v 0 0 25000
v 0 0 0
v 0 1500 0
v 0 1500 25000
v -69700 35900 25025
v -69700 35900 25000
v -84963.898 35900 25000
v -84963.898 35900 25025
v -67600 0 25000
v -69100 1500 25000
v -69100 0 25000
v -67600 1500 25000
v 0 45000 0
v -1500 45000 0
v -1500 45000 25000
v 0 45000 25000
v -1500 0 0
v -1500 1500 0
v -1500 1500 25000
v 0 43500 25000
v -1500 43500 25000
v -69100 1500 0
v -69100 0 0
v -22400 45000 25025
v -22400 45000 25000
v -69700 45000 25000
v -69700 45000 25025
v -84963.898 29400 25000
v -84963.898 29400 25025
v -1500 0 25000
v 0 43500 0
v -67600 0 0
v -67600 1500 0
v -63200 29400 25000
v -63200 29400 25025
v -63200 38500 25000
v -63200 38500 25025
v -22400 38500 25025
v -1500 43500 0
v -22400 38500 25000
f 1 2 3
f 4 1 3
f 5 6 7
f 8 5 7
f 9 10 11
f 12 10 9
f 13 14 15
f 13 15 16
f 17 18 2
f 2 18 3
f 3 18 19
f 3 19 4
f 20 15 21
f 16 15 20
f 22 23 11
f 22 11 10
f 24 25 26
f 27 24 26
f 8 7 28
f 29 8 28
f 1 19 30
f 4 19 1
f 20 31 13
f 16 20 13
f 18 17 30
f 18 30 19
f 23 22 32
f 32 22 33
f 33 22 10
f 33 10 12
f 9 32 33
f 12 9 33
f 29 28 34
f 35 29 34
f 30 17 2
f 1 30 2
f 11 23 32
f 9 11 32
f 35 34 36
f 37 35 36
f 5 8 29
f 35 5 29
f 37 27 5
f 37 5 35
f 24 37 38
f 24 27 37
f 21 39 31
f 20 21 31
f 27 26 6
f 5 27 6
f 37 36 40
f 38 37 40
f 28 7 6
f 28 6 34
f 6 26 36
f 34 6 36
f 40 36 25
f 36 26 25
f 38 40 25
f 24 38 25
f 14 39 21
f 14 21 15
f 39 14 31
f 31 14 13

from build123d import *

# Parameters (mm, degrees)
F4_DEPTH  = 25
F7_W      = 1500
F7_H      = 1500
F11_DEPTH = 25000


# Not quite as in the source:
# - the program builds the solid bodies; features that only make, move or delete a surface that nothing else refers to are left out


with BuildPart() as f4:
    # F3 (on offset) → F4 (new body)
    with BuildSketch(Plane.XY.offset(25000)):
        Polygon((-84963.8977050781, 35900), (-84963.8977050781, 29400), (-63200, 29400), (-63200, 38500), (-22400, 38500), (-22400, 45000), (-69700, 45000), (-69700, 35900), align=None)
    extrude(amount=F4_DEPTH)


with BuildPart() as f11:
    # F7 (on Top) → F11 (new body)
    with BuildSketch(Plane.XY):
        with Locations((-750, 44250)):
            Rectangle(F7_W, F7_H)
    extrude(amount=F11_DEPTH)


with BuildPart() as f11b:
    # F7 (on Top) → F11, piece 2 (new body)
    with BuildSketch(Plane.XY):
        with Locations((-750, 750)):
            Rectangle(F7_W, F7_H)
    extrude(amount=F11_DEPTH)


with BuildPart() as f11c:
    # F7 (on Top) → F11, piece 3 (new body)
    with BuildSketch(Plane.XY):
        with Locations((-68350, 750)):
            Rectangle(F7_W, F7_H)
    extrude(amount=F11_DEPTH)


solid = Compound([f4.part, f11.part, f11b.part, f11c.part])
